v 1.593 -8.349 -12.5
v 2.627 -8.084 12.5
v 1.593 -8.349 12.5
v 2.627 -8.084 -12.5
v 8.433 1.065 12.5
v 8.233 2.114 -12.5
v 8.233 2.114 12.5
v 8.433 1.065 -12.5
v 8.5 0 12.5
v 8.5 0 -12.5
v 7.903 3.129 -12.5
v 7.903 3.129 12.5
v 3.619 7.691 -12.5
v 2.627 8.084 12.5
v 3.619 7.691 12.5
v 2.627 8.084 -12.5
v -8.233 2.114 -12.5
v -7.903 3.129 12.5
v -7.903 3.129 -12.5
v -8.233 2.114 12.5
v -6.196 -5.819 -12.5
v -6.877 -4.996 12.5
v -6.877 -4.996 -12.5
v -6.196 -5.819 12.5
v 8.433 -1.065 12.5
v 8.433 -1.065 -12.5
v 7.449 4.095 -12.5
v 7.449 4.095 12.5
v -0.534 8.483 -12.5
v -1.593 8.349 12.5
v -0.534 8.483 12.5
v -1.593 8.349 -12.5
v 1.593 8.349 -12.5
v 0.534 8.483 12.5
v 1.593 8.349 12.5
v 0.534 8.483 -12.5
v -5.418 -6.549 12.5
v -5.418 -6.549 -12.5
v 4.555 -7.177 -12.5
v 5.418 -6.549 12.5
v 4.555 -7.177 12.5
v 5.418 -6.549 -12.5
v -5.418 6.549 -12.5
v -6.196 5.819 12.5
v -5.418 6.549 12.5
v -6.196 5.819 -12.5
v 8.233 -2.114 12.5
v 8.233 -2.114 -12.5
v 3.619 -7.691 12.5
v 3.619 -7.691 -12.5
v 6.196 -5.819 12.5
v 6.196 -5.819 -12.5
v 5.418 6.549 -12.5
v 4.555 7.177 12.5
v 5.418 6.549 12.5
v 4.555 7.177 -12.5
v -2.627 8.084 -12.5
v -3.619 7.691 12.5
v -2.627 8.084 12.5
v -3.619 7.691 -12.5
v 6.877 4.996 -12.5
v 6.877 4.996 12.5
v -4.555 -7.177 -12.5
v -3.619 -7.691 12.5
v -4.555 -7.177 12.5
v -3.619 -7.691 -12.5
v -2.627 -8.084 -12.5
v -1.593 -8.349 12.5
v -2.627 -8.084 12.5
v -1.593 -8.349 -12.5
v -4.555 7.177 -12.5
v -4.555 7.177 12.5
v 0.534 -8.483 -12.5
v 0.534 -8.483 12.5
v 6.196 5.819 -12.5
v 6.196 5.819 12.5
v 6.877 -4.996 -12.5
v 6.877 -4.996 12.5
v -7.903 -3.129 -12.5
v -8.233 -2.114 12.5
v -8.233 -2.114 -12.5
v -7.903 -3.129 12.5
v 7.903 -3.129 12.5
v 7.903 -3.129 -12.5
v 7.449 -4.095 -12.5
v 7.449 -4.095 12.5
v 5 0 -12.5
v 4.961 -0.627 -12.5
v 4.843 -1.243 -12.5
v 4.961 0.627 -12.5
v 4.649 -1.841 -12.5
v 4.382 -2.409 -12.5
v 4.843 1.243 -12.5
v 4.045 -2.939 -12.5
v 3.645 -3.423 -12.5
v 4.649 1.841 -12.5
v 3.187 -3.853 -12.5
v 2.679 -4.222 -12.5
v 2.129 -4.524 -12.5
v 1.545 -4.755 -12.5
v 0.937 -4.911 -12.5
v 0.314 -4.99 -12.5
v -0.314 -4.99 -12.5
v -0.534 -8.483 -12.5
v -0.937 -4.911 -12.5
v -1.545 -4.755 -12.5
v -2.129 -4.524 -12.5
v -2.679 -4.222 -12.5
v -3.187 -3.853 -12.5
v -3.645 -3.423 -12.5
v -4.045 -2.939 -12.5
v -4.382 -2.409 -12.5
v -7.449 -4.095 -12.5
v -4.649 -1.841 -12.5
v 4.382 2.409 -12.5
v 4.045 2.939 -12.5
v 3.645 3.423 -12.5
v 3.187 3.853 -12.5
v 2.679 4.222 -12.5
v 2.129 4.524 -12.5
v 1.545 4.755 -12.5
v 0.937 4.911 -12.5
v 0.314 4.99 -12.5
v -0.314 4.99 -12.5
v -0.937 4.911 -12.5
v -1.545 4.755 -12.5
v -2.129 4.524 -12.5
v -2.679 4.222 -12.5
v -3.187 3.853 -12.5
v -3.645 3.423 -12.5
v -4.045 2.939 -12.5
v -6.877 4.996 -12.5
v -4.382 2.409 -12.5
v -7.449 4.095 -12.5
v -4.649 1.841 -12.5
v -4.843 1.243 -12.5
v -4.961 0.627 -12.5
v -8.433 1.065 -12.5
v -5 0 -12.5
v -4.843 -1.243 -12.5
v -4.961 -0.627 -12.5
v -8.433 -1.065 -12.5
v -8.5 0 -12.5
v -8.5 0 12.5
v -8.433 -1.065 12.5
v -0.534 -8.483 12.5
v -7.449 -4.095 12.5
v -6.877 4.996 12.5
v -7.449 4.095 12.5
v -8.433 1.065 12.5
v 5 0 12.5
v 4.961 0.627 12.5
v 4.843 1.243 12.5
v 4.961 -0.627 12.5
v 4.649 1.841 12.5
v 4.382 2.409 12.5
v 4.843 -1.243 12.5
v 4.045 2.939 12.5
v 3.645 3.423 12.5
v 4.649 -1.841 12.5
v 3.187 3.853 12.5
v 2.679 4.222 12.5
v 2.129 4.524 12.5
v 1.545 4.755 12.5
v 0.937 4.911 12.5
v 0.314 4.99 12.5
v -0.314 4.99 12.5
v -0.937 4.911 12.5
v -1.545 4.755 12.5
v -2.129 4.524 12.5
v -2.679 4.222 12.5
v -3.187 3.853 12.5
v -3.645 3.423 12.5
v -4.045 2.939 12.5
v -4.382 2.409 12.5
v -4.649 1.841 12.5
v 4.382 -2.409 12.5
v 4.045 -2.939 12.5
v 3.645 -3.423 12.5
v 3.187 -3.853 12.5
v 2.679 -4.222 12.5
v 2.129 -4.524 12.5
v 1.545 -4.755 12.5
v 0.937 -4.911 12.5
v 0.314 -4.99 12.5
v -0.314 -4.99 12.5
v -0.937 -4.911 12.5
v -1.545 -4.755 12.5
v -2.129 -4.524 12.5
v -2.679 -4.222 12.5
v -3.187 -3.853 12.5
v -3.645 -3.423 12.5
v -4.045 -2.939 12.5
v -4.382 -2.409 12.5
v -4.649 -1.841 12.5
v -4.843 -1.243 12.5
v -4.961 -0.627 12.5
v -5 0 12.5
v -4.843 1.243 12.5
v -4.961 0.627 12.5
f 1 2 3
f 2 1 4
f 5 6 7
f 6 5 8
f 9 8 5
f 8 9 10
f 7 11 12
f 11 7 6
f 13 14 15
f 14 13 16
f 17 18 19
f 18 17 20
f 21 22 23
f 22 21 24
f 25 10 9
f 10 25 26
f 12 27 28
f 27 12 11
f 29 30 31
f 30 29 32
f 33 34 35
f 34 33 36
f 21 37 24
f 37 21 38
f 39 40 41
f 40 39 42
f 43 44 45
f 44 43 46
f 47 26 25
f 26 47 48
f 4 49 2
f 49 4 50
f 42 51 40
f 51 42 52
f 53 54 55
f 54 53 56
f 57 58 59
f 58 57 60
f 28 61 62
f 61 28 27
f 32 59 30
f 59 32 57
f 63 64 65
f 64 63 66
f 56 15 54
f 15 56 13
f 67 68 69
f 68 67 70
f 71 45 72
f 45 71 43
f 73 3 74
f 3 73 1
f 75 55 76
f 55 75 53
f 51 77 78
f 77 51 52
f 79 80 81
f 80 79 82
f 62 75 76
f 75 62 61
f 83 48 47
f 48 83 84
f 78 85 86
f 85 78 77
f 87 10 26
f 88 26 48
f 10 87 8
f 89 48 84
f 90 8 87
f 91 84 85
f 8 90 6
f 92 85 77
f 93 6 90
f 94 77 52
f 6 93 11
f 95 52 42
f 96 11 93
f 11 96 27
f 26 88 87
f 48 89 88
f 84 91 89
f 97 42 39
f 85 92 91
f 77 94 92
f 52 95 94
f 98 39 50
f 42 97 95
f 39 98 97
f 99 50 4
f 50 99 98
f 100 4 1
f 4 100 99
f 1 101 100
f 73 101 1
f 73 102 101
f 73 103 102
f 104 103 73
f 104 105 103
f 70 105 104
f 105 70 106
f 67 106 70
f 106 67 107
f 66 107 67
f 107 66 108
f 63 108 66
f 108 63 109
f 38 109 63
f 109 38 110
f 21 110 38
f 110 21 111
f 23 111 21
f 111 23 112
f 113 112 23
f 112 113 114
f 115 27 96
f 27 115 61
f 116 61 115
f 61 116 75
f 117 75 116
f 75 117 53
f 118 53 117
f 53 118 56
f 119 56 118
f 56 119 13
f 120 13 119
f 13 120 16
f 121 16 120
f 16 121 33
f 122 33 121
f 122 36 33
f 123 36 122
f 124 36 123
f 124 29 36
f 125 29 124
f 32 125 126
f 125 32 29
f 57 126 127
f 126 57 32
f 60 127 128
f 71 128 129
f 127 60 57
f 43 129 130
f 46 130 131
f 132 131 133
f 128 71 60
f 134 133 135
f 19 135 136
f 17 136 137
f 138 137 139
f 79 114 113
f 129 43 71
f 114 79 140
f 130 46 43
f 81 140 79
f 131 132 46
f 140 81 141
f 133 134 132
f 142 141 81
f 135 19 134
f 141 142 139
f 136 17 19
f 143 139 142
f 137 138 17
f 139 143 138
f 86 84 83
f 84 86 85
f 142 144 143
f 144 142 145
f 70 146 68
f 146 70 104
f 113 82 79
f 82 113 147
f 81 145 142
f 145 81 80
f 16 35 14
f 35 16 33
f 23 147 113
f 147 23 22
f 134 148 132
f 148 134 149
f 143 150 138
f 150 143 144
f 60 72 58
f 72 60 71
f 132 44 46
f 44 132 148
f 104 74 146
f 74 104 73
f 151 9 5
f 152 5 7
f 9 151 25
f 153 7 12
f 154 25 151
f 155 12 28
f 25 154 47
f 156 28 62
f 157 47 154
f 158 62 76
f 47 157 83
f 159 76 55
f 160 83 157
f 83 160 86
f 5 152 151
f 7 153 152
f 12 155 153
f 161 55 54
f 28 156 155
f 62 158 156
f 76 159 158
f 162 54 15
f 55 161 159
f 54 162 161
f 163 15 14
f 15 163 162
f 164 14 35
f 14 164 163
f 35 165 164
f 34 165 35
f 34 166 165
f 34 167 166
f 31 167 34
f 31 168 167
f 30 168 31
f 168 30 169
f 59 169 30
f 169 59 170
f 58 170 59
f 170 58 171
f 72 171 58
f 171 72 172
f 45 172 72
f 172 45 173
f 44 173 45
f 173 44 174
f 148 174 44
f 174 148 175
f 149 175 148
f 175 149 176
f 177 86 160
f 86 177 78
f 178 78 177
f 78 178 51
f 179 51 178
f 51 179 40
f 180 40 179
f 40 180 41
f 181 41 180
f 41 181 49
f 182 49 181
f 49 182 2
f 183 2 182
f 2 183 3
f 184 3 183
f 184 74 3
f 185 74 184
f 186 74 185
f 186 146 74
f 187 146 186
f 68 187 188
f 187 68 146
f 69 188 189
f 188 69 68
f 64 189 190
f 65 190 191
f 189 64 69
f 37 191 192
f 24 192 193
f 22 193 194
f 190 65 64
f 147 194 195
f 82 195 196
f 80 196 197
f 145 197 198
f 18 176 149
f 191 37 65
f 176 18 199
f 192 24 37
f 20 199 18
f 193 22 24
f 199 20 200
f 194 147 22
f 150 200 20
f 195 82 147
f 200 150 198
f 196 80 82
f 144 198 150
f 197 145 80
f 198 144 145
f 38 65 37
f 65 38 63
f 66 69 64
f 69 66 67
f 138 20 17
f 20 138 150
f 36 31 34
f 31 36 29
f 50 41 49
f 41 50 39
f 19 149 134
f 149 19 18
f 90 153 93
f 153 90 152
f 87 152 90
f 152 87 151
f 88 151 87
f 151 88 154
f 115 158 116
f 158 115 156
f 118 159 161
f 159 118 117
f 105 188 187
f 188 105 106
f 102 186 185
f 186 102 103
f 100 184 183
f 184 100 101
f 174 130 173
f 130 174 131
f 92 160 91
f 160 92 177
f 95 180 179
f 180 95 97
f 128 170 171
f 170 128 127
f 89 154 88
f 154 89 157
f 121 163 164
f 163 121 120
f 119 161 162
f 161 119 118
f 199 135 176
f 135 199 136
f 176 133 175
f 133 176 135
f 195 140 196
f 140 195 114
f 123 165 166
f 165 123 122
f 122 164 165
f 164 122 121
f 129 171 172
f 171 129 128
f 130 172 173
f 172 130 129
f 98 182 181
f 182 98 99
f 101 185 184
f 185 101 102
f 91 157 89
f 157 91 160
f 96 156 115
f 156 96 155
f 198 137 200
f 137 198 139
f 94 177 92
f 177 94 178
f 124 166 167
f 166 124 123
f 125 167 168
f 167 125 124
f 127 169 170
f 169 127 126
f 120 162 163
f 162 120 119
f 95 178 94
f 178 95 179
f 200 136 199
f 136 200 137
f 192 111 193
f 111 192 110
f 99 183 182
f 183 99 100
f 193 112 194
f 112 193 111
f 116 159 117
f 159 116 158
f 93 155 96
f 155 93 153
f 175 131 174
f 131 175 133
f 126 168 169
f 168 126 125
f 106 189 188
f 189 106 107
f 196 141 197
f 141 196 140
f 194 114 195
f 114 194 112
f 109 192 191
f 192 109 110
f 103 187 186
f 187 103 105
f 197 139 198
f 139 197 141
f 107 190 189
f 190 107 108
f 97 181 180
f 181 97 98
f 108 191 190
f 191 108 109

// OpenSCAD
$fn = 50;


difference() {
	union() {
		translate(v = [0, 0, -12.5000000000]) {
			cylinder(h = 25, r = 8.5000000000);
		}
	}
	union() {
		translate(v = [0, 0, -100.0000000000]) {
			cylinder(h = 200, r = 5.0000000000);
		}
	}
}
